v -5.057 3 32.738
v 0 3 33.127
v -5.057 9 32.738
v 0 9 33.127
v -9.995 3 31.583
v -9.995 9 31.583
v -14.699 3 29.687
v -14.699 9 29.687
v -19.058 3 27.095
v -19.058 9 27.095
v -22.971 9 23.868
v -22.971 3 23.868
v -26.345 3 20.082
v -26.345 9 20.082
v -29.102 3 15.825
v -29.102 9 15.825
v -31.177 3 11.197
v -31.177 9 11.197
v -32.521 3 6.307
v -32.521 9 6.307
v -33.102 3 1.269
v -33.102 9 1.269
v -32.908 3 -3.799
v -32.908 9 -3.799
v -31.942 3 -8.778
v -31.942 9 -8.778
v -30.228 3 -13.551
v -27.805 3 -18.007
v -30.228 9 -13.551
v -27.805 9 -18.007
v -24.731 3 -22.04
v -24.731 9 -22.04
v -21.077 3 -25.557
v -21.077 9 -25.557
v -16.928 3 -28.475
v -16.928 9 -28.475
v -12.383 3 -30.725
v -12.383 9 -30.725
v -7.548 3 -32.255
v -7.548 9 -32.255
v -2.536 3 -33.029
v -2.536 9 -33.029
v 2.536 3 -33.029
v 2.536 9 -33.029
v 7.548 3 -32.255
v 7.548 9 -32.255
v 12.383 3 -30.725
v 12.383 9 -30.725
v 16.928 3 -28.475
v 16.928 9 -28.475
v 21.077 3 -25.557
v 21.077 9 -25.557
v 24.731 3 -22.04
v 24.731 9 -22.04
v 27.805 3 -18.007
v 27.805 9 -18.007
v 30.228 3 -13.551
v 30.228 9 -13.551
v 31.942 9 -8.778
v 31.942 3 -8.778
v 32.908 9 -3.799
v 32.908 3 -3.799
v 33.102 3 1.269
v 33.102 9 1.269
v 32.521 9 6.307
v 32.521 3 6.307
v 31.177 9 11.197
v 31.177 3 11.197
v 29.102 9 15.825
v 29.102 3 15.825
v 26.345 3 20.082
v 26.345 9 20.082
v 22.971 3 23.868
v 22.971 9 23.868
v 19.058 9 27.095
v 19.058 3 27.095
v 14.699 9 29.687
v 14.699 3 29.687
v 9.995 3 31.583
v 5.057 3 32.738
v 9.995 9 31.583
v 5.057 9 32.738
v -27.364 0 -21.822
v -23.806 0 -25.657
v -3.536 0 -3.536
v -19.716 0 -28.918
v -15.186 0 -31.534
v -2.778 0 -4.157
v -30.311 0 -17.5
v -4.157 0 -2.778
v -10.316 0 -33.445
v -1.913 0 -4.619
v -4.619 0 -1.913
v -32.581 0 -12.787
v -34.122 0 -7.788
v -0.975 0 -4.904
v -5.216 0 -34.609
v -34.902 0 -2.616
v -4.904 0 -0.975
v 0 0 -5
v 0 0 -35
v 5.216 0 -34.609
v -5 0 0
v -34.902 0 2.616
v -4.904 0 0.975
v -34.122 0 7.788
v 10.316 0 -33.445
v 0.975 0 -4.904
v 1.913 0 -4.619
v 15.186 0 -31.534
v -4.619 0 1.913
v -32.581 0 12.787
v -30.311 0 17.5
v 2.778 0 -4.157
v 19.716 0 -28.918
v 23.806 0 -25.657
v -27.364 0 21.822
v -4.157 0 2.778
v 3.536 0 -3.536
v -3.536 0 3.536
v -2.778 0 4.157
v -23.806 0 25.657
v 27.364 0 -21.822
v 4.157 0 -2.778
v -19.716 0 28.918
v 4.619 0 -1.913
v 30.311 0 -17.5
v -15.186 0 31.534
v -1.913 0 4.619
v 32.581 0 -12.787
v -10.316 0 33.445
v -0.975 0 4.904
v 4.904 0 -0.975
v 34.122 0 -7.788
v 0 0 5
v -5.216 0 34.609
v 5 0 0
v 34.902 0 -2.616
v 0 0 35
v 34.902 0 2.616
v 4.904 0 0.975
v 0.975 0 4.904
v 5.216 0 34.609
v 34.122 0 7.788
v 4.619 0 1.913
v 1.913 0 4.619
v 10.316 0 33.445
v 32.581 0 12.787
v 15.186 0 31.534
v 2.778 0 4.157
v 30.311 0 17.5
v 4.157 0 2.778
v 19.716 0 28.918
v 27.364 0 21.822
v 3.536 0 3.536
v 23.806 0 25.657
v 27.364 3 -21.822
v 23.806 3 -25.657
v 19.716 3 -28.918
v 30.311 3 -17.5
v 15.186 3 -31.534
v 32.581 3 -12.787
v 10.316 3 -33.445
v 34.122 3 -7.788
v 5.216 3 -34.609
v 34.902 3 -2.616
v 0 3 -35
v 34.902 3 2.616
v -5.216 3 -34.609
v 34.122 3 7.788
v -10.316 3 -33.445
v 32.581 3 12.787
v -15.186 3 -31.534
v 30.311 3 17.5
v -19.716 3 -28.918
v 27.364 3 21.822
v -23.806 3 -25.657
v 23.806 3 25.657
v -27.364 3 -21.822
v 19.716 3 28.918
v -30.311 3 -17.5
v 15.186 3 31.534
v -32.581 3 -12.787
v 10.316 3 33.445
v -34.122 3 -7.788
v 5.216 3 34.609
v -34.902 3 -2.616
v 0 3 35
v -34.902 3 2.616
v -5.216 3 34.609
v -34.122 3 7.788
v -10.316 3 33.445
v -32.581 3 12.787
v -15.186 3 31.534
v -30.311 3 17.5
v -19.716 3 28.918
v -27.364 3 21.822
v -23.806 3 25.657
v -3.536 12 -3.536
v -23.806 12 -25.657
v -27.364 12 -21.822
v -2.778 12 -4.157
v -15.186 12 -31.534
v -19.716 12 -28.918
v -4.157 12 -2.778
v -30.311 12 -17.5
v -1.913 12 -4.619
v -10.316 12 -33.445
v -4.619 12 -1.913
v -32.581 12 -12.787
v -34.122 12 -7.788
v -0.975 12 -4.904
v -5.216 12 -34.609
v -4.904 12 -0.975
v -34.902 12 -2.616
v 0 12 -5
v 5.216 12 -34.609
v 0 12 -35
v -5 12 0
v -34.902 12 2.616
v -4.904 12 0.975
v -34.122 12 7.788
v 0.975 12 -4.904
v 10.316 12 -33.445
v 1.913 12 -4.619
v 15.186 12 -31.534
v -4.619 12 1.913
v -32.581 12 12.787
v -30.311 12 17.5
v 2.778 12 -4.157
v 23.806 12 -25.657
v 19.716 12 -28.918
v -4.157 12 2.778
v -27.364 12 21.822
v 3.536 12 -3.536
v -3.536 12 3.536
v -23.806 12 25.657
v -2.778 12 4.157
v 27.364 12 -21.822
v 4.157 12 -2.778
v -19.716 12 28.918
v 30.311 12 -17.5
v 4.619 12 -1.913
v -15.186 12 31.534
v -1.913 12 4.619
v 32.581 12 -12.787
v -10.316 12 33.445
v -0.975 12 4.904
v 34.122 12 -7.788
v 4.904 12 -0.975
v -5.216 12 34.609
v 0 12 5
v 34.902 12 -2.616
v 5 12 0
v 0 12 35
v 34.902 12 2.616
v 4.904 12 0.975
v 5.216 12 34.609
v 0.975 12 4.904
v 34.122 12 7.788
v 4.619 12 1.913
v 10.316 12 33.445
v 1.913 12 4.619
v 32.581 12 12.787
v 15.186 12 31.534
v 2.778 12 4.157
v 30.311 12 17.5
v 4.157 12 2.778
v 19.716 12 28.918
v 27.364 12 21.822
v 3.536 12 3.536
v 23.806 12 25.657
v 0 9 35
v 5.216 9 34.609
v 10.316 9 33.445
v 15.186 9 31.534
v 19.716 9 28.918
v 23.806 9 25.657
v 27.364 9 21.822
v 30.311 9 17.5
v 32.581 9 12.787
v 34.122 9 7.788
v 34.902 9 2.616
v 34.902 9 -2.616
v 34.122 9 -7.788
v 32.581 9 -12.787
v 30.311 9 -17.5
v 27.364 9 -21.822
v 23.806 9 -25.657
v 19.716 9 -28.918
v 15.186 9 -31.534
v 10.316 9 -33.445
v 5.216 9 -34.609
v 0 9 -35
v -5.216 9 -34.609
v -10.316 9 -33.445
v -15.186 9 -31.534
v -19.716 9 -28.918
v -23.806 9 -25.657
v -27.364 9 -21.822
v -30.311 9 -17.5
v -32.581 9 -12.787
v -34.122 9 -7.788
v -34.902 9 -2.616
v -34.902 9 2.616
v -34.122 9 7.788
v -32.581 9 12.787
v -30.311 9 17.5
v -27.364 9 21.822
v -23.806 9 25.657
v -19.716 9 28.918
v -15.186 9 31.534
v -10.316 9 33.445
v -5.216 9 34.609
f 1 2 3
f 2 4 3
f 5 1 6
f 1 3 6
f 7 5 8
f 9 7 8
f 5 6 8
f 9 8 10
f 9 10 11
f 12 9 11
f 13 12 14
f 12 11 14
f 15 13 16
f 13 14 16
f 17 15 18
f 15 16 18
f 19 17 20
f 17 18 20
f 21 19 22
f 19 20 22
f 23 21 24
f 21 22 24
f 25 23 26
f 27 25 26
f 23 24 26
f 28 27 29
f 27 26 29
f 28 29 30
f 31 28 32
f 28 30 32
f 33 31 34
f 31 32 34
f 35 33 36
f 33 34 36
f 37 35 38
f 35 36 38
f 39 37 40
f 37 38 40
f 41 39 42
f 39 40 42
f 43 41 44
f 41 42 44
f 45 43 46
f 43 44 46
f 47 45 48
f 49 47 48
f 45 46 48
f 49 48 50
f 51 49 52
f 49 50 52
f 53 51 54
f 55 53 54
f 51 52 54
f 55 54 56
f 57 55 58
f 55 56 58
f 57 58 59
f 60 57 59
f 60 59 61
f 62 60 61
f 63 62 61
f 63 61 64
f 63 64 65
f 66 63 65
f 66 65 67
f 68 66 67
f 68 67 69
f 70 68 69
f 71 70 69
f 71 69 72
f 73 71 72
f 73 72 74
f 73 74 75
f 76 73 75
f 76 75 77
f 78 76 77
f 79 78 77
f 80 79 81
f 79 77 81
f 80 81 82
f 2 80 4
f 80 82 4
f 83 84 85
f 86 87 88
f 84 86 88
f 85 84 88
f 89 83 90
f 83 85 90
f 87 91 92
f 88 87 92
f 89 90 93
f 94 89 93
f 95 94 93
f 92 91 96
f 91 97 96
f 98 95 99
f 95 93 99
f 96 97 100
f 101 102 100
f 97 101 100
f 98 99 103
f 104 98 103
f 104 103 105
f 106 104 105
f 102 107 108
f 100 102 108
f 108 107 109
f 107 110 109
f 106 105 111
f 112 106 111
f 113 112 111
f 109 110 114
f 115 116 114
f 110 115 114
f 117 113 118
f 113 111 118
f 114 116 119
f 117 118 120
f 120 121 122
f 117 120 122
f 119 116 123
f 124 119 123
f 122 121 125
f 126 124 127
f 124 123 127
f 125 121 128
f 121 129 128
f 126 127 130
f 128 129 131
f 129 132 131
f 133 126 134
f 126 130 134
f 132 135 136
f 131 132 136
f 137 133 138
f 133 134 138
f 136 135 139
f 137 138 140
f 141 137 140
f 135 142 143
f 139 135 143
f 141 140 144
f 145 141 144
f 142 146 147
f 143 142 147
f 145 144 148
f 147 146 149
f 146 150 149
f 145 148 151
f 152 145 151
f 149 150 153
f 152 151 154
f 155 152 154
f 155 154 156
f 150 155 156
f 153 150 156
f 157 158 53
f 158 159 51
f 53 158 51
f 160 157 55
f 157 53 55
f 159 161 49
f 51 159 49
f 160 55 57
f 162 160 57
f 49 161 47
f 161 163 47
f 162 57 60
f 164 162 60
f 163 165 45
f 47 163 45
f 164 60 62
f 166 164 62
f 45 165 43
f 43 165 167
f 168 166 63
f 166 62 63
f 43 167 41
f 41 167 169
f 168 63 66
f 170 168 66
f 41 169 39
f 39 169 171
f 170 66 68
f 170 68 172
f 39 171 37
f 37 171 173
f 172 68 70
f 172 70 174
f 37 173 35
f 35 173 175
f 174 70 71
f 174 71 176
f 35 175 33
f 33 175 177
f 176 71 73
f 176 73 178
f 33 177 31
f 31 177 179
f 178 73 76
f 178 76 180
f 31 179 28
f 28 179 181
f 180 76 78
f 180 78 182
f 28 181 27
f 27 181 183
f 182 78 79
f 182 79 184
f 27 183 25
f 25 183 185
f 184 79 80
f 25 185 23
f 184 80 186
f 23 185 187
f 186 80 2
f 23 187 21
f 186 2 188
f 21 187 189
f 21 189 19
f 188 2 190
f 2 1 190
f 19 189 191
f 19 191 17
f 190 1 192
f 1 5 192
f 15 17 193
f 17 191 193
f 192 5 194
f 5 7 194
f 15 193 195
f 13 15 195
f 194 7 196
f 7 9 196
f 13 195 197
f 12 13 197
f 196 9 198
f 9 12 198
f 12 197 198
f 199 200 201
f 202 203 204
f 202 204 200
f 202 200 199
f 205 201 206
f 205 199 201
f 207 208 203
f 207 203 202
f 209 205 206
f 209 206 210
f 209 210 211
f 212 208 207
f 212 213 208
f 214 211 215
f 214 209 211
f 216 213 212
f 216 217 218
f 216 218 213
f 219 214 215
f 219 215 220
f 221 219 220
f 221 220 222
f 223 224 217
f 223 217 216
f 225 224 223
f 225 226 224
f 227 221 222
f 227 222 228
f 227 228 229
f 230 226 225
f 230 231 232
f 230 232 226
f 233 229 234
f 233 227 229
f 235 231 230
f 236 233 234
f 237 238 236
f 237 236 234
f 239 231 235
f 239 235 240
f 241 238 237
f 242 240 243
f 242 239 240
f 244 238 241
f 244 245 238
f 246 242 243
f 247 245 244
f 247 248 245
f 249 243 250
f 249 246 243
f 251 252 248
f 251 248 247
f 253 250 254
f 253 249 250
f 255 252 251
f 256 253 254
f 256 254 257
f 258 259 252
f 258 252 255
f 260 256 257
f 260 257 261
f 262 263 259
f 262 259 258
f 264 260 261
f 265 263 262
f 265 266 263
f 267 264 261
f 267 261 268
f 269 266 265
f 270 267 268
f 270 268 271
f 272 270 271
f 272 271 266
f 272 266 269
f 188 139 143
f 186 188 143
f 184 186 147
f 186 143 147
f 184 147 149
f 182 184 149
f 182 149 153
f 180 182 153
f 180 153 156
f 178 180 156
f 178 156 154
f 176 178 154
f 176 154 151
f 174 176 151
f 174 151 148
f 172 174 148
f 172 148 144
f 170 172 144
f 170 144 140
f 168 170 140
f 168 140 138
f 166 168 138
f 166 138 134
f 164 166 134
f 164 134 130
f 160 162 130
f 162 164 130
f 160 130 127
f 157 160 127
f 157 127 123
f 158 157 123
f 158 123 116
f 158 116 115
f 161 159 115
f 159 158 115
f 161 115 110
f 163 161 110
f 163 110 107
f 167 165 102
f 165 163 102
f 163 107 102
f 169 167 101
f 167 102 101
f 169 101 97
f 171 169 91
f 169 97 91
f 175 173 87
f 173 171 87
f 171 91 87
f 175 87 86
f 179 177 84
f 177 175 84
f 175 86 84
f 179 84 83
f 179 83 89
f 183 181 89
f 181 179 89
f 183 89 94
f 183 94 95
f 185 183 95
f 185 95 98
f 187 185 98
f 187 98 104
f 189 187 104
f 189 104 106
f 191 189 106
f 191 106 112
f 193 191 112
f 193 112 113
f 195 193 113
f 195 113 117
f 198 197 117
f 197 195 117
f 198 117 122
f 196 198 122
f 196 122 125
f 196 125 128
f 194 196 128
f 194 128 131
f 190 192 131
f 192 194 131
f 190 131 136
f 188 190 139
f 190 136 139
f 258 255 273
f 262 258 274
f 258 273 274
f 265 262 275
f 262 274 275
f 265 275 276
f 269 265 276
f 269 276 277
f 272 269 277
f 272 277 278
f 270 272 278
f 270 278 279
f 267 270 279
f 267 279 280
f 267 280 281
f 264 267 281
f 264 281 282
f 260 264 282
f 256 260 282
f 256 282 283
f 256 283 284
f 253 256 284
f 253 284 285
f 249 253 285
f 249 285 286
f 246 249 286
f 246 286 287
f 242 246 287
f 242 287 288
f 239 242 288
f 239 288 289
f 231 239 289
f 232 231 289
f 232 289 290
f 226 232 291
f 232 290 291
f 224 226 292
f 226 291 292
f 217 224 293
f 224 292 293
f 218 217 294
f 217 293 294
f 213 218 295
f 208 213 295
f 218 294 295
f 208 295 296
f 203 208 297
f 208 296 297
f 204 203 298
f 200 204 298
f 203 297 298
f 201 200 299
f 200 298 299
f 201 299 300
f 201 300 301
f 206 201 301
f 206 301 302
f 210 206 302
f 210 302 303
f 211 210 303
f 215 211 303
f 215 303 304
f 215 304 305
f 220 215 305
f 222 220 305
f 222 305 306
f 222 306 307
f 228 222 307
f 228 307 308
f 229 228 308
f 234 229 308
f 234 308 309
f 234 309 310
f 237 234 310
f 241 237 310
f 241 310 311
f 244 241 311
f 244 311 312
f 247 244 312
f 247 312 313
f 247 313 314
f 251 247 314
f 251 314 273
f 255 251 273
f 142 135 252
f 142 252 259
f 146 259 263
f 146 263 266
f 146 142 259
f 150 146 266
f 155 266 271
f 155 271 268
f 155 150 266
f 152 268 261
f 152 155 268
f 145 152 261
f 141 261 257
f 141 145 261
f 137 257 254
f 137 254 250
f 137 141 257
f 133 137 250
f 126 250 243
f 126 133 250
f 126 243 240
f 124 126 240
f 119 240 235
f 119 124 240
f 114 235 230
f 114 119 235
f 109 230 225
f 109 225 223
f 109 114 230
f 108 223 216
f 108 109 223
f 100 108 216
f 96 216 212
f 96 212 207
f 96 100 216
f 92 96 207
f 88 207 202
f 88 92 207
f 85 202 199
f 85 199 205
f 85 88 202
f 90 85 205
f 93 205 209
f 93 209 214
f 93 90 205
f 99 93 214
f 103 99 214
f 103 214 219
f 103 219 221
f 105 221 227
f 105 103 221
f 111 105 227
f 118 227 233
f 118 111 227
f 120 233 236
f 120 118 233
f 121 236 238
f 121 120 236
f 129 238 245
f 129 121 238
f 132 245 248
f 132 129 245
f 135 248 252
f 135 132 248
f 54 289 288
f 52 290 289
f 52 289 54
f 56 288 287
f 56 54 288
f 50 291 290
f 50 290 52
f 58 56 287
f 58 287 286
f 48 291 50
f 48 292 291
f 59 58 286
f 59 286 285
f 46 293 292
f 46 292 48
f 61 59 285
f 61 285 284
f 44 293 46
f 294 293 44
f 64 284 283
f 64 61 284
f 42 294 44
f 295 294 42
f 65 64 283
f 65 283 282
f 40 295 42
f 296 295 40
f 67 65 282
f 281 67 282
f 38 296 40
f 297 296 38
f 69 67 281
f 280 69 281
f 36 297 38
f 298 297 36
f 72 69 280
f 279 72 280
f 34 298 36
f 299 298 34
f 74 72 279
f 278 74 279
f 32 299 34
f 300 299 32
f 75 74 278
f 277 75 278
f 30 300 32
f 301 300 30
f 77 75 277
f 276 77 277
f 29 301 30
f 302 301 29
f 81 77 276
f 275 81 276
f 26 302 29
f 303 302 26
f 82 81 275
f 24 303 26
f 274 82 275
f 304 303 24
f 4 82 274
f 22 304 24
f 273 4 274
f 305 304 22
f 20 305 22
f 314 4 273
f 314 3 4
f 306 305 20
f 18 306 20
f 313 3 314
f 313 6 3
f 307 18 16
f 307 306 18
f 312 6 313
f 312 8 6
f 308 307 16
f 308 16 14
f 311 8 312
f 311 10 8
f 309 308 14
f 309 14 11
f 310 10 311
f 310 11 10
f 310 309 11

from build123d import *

# Parameters (mm, degrees)
SKETCH1_R           = 35
SKETCH1_R_2         = 5
BOSS_EXTRUDE1_DEPTH = 12
SKETCH2_W           = 1.873405934
SKETCH2_H           = 6


with BuildPart() as part:
    # Sketch1 → Boss-Extrude1 (new body)
    with BuildSketch(Plane(origin=(0, 0, 0), x_dir=(1, 0, 0), z_dir=(0, 1, 0))):
        with Locations(Location((0, 0, 0), (0, 0, 270))):
            Circle(SKETCH1_R)
        with Locations(Location((0, 0, 0), (0, 0, 270))):
            Circle(SKETCH1_R_2, mode=Mode.SUBTRACT)
    extrude(amount=BOSS_EXTRUDE1_DEPTH)

    # Sketch2 → Cut-Revolve1 (revolve, cut)
    with BuildSketch(Plane.XY, mode=Mode.PRIVATE) as cut_revolve1_sk:
        with Locations((-34.063297033, 6)):
            Rectangle(SKETCH2_W, SKETCH2_H)
    revolve(cut_revolve1_sk.sketch.rotate(Axis((0, 28.885066711, 0), (0, -1, 0)), 270), axis=Axis((0, 28.885066711, 0), (0, -1, 0)), mode=Mode.SUBTRACT)


solid = part.part
